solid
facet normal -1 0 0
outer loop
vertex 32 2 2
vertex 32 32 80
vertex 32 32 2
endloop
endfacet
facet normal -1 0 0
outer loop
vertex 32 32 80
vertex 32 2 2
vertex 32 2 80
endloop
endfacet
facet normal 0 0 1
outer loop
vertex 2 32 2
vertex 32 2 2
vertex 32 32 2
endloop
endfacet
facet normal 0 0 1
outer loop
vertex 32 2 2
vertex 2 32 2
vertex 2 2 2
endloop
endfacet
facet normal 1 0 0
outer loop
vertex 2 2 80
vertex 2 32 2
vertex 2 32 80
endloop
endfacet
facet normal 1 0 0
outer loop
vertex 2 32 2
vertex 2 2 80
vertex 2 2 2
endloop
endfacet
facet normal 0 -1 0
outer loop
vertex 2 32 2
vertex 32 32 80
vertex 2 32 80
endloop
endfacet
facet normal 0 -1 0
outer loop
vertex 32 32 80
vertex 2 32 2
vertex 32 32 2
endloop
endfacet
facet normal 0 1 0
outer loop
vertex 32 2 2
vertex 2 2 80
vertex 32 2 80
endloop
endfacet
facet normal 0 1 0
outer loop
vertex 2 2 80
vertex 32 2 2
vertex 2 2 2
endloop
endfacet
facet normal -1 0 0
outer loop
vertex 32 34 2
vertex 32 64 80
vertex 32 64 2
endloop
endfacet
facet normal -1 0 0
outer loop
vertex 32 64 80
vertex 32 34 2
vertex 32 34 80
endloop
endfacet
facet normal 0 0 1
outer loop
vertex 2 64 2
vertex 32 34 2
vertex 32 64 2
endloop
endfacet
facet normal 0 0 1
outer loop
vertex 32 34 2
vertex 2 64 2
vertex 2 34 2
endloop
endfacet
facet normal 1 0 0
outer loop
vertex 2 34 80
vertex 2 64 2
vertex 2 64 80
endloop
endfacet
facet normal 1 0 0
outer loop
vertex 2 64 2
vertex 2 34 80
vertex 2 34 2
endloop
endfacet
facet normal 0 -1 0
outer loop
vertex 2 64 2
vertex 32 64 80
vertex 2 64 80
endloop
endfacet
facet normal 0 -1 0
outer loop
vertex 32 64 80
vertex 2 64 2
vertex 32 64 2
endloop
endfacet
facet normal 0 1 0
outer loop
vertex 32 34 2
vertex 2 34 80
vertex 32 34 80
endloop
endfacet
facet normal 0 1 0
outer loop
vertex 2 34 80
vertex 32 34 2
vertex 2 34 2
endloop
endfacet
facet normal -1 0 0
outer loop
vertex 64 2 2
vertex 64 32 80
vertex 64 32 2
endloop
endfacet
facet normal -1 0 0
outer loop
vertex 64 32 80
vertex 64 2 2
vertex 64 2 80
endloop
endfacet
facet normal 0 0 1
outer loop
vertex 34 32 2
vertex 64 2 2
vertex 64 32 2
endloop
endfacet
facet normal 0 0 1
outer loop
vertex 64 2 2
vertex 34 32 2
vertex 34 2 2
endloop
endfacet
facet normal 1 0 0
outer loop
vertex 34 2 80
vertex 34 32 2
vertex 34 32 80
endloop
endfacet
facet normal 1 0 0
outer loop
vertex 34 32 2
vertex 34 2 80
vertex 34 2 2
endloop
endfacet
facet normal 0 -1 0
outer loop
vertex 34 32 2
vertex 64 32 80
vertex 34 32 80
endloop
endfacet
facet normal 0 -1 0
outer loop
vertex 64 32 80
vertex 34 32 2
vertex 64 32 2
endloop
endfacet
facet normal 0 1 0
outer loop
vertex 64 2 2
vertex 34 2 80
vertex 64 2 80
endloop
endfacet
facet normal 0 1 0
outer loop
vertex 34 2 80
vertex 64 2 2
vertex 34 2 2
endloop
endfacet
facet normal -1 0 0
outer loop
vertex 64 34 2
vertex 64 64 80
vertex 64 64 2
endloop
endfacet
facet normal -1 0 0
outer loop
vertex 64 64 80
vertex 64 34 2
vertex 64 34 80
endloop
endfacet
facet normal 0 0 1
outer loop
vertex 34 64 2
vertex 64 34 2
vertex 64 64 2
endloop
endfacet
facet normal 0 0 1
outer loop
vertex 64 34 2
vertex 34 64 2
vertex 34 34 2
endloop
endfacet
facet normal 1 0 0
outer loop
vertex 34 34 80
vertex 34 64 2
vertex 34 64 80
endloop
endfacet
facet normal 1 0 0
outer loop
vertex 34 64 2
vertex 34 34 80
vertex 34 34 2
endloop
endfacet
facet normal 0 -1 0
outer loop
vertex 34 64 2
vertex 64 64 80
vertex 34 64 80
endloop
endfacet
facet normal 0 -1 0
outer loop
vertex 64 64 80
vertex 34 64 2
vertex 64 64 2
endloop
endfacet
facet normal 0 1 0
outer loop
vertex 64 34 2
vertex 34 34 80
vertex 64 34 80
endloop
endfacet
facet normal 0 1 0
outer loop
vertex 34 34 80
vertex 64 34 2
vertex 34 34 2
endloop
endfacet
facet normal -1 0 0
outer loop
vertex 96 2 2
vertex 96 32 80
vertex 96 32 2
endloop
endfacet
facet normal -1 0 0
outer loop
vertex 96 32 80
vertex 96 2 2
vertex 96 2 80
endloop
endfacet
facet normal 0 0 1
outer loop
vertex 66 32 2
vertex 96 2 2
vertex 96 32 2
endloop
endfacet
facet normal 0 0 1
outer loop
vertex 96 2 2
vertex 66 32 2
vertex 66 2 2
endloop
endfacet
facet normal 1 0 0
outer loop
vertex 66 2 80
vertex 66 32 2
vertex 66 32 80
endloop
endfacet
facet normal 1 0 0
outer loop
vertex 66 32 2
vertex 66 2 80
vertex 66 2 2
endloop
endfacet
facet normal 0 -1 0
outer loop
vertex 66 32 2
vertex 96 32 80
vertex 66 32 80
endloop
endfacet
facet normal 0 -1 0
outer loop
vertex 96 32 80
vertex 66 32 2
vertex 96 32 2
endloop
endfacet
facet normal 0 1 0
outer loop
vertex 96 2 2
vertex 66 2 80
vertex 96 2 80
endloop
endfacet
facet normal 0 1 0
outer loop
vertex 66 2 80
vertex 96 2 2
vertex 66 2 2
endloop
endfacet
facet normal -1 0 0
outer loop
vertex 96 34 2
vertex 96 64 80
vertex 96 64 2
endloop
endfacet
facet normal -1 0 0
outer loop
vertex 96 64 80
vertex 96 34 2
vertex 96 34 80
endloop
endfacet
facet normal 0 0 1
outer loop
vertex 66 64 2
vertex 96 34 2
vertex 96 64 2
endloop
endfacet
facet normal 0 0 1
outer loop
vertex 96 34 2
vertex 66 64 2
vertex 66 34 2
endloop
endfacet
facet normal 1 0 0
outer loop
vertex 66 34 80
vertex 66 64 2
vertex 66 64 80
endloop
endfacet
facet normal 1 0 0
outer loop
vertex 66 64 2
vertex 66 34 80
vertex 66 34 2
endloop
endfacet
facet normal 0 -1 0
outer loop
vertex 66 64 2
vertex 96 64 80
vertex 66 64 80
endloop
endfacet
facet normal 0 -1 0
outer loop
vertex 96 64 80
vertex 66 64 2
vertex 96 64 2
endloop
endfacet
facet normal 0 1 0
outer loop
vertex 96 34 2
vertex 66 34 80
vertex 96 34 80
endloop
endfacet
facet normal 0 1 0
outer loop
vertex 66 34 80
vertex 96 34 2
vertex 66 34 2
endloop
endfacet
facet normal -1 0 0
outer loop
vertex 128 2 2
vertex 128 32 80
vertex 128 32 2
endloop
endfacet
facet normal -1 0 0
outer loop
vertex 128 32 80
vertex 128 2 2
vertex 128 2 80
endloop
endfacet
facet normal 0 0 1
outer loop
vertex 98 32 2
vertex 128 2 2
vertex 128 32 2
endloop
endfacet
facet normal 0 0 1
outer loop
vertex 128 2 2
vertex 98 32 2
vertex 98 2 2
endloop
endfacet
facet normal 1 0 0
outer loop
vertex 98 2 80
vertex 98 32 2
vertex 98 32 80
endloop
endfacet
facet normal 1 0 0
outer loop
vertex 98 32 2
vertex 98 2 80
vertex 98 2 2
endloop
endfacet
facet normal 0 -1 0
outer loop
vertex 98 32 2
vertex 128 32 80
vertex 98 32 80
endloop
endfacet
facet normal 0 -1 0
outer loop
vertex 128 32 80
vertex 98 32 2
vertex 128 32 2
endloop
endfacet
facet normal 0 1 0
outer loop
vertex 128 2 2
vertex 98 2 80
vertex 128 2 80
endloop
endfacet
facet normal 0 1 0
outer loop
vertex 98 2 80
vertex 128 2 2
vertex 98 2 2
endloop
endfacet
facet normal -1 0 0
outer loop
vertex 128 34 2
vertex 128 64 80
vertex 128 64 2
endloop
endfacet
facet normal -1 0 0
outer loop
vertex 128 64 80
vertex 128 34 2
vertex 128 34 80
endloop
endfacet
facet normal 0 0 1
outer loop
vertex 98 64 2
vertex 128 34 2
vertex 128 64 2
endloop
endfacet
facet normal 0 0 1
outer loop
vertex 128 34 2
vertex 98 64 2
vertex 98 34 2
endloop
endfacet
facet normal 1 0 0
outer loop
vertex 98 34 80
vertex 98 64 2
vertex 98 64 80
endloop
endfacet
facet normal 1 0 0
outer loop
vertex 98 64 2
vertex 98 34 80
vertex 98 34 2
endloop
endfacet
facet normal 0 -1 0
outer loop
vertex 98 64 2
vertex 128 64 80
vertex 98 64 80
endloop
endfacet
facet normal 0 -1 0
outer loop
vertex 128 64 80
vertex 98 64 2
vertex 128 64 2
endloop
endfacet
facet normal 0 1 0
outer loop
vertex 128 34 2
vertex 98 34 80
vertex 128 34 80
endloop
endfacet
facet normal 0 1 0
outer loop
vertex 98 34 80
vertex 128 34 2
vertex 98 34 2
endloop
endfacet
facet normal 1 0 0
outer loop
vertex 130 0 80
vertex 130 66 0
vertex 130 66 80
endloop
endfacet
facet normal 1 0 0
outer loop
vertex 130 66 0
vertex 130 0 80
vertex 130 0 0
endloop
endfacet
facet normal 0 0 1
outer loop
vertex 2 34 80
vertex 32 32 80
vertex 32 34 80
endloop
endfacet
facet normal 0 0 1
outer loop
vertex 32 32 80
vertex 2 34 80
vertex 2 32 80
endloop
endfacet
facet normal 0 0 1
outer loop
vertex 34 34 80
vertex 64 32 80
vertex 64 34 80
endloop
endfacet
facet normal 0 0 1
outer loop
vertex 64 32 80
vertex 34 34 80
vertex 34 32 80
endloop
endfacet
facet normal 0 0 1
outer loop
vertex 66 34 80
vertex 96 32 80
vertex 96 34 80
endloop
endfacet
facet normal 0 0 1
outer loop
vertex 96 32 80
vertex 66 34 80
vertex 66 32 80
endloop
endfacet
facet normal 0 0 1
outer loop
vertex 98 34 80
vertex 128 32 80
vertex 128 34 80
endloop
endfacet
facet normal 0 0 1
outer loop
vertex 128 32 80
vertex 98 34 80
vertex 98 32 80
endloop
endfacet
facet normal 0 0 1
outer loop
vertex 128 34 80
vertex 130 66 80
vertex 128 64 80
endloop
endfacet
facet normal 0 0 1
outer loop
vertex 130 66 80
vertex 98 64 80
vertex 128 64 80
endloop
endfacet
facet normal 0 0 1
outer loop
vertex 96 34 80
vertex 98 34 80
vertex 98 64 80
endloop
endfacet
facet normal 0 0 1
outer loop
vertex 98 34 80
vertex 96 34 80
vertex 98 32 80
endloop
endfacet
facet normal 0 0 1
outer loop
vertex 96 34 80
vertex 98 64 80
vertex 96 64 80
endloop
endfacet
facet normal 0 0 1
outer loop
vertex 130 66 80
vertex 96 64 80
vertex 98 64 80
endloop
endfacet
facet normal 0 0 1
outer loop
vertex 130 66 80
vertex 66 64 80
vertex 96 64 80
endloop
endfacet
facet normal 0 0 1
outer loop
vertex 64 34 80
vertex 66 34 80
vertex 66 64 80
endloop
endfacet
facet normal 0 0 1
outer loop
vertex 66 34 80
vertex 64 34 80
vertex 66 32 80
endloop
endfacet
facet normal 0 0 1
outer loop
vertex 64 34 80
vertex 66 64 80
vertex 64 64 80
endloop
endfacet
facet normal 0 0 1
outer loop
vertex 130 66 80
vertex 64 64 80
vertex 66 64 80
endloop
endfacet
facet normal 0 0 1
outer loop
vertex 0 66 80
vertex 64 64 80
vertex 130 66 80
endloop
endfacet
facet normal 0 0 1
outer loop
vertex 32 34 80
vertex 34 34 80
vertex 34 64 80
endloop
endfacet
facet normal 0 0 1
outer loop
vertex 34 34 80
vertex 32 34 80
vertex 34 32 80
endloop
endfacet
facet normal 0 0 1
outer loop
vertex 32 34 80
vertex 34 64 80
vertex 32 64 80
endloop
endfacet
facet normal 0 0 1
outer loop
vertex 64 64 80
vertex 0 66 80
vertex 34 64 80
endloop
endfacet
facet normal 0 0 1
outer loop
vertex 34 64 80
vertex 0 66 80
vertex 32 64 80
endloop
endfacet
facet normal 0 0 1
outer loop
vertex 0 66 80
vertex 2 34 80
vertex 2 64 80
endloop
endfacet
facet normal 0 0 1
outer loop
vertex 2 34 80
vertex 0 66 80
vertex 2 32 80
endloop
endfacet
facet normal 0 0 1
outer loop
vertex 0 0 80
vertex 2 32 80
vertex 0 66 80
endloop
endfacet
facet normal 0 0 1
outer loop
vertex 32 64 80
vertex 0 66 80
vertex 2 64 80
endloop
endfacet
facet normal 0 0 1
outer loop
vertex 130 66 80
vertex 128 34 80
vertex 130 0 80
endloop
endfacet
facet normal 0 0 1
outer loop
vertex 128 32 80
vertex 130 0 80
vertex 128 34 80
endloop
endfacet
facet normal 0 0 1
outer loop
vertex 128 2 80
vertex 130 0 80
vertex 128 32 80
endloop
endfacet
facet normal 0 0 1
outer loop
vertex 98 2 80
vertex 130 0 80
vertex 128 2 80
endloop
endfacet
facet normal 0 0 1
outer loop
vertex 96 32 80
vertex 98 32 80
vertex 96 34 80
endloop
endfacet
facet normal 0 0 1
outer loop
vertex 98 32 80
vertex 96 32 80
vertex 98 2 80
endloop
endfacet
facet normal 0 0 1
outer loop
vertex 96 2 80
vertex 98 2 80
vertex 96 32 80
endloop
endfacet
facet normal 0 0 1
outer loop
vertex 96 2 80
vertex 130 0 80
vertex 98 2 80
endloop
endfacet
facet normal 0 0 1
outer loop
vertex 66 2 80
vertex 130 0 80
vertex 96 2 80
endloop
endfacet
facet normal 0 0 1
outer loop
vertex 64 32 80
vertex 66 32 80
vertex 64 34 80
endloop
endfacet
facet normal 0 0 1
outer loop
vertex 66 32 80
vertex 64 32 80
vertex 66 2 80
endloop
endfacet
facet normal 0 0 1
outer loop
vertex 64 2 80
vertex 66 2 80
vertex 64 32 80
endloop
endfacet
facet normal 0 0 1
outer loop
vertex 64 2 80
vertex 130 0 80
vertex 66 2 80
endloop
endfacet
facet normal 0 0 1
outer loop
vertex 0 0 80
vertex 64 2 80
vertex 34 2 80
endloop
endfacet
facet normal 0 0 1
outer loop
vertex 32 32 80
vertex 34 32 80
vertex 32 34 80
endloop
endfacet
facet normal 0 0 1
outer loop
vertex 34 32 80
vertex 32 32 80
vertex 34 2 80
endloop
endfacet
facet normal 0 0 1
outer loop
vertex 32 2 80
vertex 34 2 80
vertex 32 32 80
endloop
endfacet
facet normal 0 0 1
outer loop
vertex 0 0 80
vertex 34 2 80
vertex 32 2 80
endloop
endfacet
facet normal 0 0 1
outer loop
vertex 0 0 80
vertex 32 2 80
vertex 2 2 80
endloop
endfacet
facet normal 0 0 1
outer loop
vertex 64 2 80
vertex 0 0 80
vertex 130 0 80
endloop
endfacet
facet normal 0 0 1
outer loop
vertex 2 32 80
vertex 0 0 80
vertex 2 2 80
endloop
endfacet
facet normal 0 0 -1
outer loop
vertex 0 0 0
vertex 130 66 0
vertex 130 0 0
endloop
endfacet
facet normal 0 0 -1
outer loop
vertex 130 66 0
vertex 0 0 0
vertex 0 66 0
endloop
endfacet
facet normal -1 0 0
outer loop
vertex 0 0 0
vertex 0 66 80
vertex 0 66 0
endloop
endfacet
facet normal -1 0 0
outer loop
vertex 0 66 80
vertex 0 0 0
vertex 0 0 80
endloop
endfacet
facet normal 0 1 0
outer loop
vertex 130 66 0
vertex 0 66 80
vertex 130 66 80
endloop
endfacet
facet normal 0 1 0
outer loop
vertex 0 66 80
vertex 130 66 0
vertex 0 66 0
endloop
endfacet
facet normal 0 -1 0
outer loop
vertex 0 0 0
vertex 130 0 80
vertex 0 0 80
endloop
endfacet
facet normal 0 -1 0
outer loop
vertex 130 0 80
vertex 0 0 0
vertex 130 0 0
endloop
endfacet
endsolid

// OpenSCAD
// 定义长方体的尺寸
length = 130;
width = 66;
height = 80;
grid_size = 30;
divider_thickness = 2;

// 创建长方体
difference() {
    // 外围长方体
    cube([length, width, height]);

    // 内部格子
    for (x = [divider_thickness:grid_size+divider_thickness:length-grid_size]) {
        for (y = [divider_thickness:grid_size+divider_thickness:width-grid_size]) {
            translate([x, y, 2])
                cube([grid_size, grid_size, height + 1]);
        }
    }
}
